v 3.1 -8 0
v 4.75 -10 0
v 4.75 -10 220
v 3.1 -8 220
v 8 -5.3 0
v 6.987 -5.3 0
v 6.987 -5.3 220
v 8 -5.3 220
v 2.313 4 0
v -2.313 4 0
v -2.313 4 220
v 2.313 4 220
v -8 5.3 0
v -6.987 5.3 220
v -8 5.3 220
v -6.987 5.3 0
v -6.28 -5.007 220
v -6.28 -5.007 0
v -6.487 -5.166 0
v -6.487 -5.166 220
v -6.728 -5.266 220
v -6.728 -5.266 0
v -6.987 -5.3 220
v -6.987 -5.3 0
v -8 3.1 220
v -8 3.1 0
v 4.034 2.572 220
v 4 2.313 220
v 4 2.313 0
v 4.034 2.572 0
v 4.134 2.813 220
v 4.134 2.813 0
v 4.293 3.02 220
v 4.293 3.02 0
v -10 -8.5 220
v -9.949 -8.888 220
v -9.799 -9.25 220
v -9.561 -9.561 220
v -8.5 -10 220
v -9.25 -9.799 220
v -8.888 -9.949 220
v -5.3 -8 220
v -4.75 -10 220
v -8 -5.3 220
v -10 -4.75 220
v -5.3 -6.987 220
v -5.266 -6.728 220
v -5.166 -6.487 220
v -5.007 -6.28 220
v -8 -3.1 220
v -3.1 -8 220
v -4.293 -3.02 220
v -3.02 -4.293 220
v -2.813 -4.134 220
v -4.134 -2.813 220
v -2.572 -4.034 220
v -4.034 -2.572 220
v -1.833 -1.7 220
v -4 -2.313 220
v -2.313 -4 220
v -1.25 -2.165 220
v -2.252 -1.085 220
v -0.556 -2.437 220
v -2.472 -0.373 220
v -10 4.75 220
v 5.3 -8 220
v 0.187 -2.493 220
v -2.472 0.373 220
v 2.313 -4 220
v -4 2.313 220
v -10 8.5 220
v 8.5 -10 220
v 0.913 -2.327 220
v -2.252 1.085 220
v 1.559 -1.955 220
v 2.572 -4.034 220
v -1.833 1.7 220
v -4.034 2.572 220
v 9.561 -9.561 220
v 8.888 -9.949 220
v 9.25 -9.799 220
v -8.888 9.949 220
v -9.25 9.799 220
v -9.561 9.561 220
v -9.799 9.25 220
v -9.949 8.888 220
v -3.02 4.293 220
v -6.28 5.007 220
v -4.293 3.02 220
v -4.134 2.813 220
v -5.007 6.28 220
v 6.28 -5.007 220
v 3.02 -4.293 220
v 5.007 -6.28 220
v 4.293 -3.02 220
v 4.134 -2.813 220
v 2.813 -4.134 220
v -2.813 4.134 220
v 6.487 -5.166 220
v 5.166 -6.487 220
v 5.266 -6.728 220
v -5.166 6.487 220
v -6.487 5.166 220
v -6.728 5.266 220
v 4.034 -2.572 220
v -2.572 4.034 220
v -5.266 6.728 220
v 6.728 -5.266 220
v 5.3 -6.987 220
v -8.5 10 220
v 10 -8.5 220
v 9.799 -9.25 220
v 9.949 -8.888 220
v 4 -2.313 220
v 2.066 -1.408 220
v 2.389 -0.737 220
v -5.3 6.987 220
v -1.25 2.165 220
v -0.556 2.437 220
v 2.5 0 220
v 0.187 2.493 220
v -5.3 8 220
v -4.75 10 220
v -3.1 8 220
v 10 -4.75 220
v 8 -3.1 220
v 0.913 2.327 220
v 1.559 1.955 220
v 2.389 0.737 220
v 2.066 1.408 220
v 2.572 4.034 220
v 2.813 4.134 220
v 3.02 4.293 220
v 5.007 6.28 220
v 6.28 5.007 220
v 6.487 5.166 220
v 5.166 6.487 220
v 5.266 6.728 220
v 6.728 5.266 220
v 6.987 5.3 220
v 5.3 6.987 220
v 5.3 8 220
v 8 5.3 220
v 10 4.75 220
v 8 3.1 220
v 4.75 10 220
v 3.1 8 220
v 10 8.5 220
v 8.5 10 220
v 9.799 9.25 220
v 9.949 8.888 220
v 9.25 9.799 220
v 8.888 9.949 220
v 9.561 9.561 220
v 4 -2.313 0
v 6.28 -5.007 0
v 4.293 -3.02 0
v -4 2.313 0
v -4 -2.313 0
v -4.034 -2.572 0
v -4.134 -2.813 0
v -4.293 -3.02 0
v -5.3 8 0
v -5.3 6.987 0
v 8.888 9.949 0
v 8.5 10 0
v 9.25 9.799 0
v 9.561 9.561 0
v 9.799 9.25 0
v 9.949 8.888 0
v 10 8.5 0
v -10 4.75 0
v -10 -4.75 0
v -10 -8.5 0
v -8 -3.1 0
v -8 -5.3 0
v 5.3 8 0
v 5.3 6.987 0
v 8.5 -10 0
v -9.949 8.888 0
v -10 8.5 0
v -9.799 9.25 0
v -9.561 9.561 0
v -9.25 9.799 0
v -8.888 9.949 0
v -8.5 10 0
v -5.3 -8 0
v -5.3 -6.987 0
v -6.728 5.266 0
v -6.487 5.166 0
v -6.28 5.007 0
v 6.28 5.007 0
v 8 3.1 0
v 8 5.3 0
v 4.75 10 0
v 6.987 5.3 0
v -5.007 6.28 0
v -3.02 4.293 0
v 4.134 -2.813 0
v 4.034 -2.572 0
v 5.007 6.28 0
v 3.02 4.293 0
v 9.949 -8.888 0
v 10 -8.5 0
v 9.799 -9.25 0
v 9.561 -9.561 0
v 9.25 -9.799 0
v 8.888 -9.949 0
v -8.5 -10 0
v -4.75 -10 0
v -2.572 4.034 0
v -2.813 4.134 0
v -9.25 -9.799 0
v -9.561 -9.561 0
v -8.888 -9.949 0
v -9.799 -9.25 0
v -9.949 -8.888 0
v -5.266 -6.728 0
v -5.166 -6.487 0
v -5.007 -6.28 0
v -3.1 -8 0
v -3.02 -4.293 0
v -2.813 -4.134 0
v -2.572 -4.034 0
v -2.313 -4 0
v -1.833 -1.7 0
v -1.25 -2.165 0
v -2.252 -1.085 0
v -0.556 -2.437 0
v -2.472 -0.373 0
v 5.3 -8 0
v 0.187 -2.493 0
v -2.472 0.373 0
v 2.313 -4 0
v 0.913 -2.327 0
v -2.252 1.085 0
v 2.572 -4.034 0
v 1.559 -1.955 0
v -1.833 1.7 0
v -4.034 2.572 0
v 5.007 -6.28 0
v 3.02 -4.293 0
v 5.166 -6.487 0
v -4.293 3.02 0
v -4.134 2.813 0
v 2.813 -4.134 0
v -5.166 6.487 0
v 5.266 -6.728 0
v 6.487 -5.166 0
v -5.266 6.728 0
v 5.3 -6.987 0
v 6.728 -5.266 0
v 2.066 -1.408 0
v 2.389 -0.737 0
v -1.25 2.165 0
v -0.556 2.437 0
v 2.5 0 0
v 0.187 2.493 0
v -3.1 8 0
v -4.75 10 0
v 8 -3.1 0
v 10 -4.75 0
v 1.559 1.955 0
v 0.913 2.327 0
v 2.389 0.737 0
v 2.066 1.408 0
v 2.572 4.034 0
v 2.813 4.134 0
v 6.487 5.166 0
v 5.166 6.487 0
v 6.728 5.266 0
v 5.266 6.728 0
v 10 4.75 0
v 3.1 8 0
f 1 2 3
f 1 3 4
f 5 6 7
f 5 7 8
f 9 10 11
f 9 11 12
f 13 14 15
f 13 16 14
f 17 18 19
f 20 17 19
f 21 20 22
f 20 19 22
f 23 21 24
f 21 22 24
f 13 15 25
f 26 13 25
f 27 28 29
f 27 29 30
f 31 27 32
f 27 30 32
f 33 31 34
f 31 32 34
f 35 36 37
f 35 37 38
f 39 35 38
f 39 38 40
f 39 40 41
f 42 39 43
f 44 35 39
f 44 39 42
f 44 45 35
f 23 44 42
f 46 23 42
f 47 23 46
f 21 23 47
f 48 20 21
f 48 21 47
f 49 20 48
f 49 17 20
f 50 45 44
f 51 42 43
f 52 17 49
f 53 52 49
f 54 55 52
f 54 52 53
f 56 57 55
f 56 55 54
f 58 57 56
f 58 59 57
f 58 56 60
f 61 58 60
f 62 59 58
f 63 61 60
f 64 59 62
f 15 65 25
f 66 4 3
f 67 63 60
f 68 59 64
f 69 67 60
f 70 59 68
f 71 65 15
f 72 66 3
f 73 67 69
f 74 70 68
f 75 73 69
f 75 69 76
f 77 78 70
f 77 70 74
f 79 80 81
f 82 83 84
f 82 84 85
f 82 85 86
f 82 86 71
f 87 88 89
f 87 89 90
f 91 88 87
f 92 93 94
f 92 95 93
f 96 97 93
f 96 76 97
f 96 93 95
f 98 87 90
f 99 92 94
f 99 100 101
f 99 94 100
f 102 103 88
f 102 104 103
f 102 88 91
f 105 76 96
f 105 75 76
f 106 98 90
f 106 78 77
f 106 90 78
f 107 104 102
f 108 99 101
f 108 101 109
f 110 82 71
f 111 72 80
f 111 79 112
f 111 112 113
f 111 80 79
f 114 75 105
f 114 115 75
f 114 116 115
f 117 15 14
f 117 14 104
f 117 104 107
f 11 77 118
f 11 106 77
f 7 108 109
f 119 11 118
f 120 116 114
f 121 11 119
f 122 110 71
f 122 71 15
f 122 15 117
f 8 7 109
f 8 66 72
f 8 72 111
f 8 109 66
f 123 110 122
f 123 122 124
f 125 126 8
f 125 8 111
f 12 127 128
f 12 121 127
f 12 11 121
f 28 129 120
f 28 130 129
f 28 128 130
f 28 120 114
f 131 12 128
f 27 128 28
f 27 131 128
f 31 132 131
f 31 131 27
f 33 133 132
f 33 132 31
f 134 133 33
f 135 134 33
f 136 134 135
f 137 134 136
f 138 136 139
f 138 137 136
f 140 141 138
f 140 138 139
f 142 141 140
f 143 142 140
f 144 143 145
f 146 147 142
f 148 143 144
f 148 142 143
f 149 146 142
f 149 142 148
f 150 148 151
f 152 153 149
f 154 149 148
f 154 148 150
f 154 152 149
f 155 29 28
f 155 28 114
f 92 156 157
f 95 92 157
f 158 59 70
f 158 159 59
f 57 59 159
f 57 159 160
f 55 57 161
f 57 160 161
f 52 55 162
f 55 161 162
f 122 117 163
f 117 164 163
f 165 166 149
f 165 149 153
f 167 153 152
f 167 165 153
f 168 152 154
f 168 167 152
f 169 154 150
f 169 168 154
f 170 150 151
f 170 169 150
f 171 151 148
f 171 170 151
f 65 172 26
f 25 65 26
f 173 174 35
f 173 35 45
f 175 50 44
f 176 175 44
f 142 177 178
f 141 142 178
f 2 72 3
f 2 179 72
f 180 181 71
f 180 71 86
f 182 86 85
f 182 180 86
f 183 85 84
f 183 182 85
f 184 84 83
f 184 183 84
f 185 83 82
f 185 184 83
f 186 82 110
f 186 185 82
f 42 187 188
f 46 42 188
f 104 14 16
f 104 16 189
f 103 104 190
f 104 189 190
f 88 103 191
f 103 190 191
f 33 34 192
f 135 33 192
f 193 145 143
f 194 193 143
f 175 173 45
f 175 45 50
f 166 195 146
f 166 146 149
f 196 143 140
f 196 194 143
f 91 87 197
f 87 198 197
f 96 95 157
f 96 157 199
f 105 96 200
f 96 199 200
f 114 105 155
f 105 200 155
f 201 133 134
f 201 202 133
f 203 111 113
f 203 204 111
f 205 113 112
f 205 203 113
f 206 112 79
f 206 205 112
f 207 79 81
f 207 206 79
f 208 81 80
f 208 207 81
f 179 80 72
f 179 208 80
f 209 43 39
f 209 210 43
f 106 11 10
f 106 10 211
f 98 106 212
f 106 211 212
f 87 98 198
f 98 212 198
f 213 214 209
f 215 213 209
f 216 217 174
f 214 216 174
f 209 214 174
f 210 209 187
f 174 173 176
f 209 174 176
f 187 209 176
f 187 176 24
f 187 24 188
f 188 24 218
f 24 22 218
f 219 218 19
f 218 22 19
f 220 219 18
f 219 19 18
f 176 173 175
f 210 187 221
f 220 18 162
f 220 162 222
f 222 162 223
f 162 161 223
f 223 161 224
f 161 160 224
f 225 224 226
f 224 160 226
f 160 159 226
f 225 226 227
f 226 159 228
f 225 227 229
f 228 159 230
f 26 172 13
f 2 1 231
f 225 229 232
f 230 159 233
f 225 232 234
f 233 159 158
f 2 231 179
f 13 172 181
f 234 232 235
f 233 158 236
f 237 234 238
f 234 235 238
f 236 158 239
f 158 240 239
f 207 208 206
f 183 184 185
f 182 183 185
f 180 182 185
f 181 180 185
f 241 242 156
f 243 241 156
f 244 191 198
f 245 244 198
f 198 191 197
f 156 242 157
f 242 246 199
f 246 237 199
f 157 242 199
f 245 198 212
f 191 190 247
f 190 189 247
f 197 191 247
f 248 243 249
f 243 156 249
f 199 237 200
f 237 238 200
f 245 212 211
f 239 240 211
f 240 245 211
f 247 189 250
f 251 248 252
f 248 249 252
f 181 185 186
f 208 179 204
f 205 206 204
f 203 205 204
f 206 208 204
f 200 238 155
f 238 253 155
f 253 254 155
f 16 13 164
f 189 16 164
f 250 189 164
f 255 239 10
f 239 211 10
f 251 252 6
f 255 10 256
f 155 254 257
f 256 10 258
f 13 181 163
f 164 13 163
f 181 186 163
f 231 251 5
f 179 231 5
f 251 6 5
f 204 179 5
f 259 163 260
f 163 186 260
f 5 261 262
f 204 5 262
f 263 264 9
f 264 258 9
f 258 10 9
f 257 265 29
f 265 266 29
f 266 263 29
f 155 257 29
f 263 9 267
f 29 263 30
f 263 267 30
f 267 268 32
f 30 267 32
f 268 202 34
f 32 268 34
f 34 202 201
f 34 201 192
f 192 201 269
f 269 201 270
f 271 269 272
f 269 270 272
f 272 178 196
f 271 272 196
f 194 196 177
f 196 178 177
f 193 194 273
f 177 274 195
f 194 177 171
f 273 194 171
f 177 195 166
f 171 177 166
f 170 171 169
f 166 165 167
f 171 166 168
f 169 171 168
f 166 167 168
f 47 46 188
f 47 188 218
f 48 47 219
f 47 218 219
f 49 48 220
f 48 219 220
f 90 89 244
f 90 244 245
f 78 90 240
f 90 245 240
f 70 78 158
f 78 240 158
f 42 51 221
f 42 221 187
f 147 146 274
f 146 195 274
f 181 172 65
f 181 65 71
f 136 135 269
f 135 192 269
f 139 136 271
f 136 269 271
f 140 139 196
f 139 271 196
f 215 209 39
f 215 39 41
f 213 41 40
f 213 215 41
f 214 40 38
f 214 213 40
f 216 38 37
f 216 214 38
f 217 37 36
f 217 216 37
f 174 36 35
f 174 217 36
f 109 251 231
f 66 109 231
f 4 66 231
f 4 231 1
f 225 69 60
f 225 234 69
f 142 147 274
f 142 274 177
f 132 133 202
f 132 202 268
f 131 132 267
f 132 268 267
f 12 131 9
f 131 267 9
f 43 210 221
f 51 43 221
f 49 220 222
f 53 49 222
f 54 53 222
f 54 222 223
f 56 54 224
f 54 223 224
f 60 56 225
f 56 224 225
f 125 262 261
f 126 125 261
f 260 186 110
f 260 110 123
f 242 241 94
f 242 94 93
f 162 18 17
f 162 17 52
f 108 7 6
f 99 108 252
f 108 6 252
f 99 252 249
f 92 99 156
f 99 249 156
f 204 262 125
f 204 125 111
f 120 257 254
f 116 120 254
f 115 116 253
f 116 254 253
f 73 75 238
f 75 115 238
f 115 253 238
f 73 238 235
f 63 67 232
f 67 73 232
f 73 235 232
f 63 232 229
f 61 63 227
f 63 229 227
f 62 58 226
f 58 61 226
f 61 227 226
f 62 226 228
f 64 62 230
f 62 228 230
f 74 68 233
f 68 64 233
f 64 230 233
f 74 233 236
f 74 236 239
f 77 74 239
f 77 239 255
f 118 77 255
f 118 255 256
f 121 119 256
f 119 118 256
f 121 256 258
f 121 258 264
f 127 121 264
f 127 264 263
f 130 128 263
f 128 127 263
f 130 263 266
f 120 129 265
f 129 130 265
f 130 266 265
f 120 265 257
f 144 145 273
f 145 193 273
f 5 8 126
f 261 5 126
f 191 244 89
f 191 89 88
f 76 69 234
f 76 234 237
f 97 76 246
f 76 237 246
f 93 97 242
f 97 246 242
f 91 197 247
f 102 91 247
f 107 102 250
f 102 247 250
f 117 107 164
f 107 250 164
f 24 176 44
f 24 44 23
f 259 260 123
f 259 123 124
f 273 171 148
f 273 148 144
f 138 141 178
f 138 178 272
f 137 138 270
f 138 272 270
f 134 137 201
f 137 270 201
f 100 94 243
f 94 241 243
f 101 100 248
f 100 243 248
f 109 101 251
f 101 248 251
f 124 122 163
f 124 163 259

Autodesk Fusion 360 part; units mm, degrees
sketch "Sketch1" plane through (0, 0, 0) normal (0, 0, 1) x (1, 0, 0)
  circle A0 centre (0, 0) radius 2.5
  arc A1 (-10, -8.5) -> (-8.5, -10) centre (-8.5, -8.5) ccw
  arc A2 (8.5, -10) -> (10, -8.5) centre (8.5, -8.5) ccw
  arc A3 (10, 8.5) -> (8.5, 10) centre (8.5, 8.5) ccw
  arc A4 (-8.5, 10) -> (-10, 8.5) centre (-8.5, 8.5) ccw
  line L0 (-6.987, 5.3) -> (-8, 5.3)
  line L1 (6.987, -5.3) -> (8, -5.3)
  line L2 (8, 5.3) -> (6.987, 5.3)
  line L3 (-8, -5.3) -> (-6.987, -5.3)
  line L4 (-5.3, -8) -> (-5.3, -6.987)
  line L5 (-5.3, 6.987) -> (-5.3, 8)
  line L6 (5.3, 8) -> (5.3, 6.987)
  line L7 (5.3, -6.987) -> (5.3, -8)
  line L8 (2.313, -4) -> (-2.313, -4)
  line L9 (-4, -2.313) -> (-4, 2.313)
  line L10 (-2.313, 4) -> (2.313, 4)
  line L11 (4, 2.313) -> (4, -2.313)
  line L12 (6.2799, -5.0071) -> (4.2929, -3.0201)
  line L13 (5.0071, -6.2799) -> (3.0201, -4.2929)
  line L14 (-5.0071, -6.2799) -> (-3.0201, -4.2929)
  line L15 (-6.2799, -5.0071) -> (-4.2929, -3.0201)
  line L16 (-4.2929, 3.0201) -> (-6.2799, 5.0071)
  line L17 (-3.0201, 4.2929) -> (-5.0071, 6.2799)
  line L18 (3.0201, 4.2929) -> (5.0071, 6.2799)
  line L19 (4.2929, 3.0201) -> (6.2799, 5.0071)
  line L20 (0, -15) -> (0, 19) construction
  line L21 (-20, 0) -> (20, 0) construction
  line L22 (-10, -8.5) -> (-10, -4.75)
  line L23 (-10, 4.75) -> (-10, 8.5)
  line L24 (8.5, -10) -> (4.75, -10)
  line L25 (-4.75, -10) -> (-8.5, -10)
  line L26 (10, 8.5) -> (10, 4.75)
  line L27 (10, -4.75) -> (10, -8.5)
  line L28 (-8.5, 10) -> (-4.75, 10)
  line L29 (4.75, 10) -> (8.5, 10)
  line L30 (5.3, -8) -> (3.1, -8)
  line L31 (-3.1, -8) -> (-5.3, -8)
  line L32 (8, -5.3) -> (8, -3.1)
  line L33 (8, 3.1) -> (8, 5.3)
  line L34 (-5.3, 8) -> (-3.1, 8)
  line L35 (3.1, 8) -> (5.3, 8)
  line L36 (-8, 5.3) -> (-8, 3.1)
  line L37 (-8, -3.1) -> (-8, -5.3)
  line L38 (-4.75, -10) -> (-3.1, -8)
  line L39 (4.75, -10) -> (3.1, -8)
  line L40 (10, -4.75) -> (8, -3.1)
  line L41 (8, 3.1) -> (10, 4.75)
  line L42 (4.75, 10) -> (3.1, 8)
  line L43 (-4.75, 10) -> (-3.1, 8)
  line L44 (-10, 4.75) -> (-8, 3.1)
  line L45 (-10, -4.75) -> (-8, -3.1)
  arc A5 (-5.0071, -6.2799) -> (-5.3, -6.987) centre (-4.3, -6.987) ccw
  arc A6 (5.3, -6.987) -> (5.0071, -6.2799) centre (4.3, -6.987) ccw
  arc A7 (3.0201, -4.2929) -> (2.313, -4) centre (2.313, -5) ccw
  arc A8 (-2.313, -4) -> (-3.0201, -4.2929) centre (-2.313, -5) ccw
  arc A9 (-6.987, -5.3) -> (-6.2799, -5.0071) centre (-6.987, -4.3) ccw
  arc A10 (-4.2929, -3.0201) -> (-4, -2.313) centre (-5, -2.313) ccw
  arc A11 (-4, 2.313) -> (-4.2929, 3.0201) centre (-5, 2.313) ccw
  arc A12 (-6.2799, 5.0071) -> (-6.987, 5.3) centre (-6.987, 4.3) ccw
  arc A13 (6.2799, -5.0071) -> (6.987, -5.3) centre (6.987, -4.3) ccw
  arc A14 (4, -2.313) -> (4.2929, -3.0201) centre (5, -2.313) ccw
  arc A15 (4.2929, 3.0201) -> (4, 2.313) centre (5, 2.313) ccw
  arc A16 (6.987, 5.3) -> (6.2799, 5.0071) centre (6.987, 4.3) ccw
  arc A17 (5.0071, 6.2799) -> (5.3, 6.987) centre (4.3, 6.987) ccw
  arc A18 (2.313, 4) -> (3.0201, 4.2929) centre (2.313, 5) ccw
  arc A19 (-3.0201, 4.2929) -> (-2.313, 4) centre (-2.313, 5) ccw
  arc A20 (-5.3, 6.987) -> (-5.0071, 6.2799) centre (-4.3, 6.987) ccw
  dimension "d3" = 5
  dimension "d4" = 1.5
  dimension "d5" = 16
  dimension "d6" = 10.6
  dimension "d7" = 10.6
  dimension "d8" = 16
  dimension "d23" = 1
extrude "Extrude1" add sketch "Sketch1" along normal blind 149

Autodesk Fusion 360 part; units mm, degrees
sketch "Sketch1" plane through (0, 0, 0) normal (0, 0, 1) x (1, 0, 0)
  circle A0 centre (0, 0) radius 2.5
  arc A1 (-10, -8.5) -> (-8.5, -10) centre (-8.5, -8.5) ccw
  arc A2 (8.5, -10) -> (10, -8.5) centre (8.5, -8.5) ccw
  arc A3 (10, 8.5) -> (8.5, 10) centre (8.5, 8.5) ccw
  arc A4 (-8.5, 10) -> (-10, 8.5) centre (-8.5, 8.5) ccw
  line L0 (-6.987, 5.3) -> (-8, 5.3)
  line L1 (6.987, -5.3) -> (8, -5.3)
  line L2 (8, 5.3) -> (6.987, 5.3)
  line L3 (-8, -5.3) -> (-6.987, -5.3)
  line L4 (-5.3, -8) -> (-5.3, -6.987)
  line L5 (-5.3, 6.987) -> (-5.3, 8)
  line L6 (5.3, 8) -> (5.3, 6.987)
  line L7 (5.3, -6.987) -> (5.3, -8)
  line L8 (2.313, -4) -> (-2.313, -4)
  line L9 (-4, -2.313) -> (-4, 2.313)
  line L10 (-2.313, 4) -> (2.313, 4)
  line L11 (4, 2.313) -> (4, -2.313)
  line L12 (6.2799, -5.0071) -> (4.2929, -3.0201)
  line L13 (5.0071, -6.2799) -> (3.0201, -4.2929)
  line L14 (-5.0071, -6.2799) -> (-3.0201, -4.2929)
  line L15 (-6.2799, -5.0071) -> (-4.2929, -3.0201)
  line L16 (-4.2929, 3.0201) -> (-6.2799, 5.0071)
  line L17 (-3.0201, 4.2929) -> (-5.0071, 6.2799)
  line L18 (3.0201, 4.2929) -> (5.0071, 6.2799)
  line L19 (4.2929, 3.0201) -> (6.2799, 5.0071)
  line L20 (0, -15) -> (0, 19) construction
  line L21 (-20, 0) -> (20, 0) construction
  line L22 (-10, -8.5) -> (-10, -4.75)
  line L23 (-10, 4.75) -> (-10, 8.5)
  line L24 (8.5, -10) -> (4.75, -10)
  line L25 (-4.75, -10) -> (-8.5, -10)
  line L26 (10, 8.5) -> (10, 4.75)
  line L27 (10, -4.75) -> (10, -8.5)
  line L28 (-8.5, 10) -> (-4.75, 10)
  line L29 (4.75, 10) -> (8.5, 10)
  line L30 (5.3, -8) -> (3.1, -8)
  line L31 (-3.1, -8) -> (-5.3, -8)
  line L32 (8, -5.3) -> (8, -3.1)
  line L33 (8, 3.1) -> (8, 5.3)
  line L34 (-5.3, 8) -> (-3.1, 8)
  line L35 (3.1, 8) -> (5.3, 8)
  line L36 (-8, 5.3) -> (-8, 3.1)
  line L37 (-8, -3.1) -> (-8, -5.3)
  line L38 (-4.75, -10) -> (-3.1, -8)
  line L39 (4.75, -10) -> (3.1, -8)
  line L40 (10, -4.75) -> (8, -3.1)
  line L41 (8, 3.1) -> (10, 4.75)
  line L42 (4.75, 10) -> (3.1, 8)
  line L43 (-4.75, 10) -> (-3.1, 8)
  line L44 (-10, 4.75) -> (-8, 3.1)
  line L45 (-10, -4.75) -> (-8, -3.1)
  arc A5 (-5.0071, -6.2799) -> (-5.3, -6.987) centre (-4.3, -6.987) ccw
  arc A6 (5.3, -6.987) -> (5.0071, -6.2799) centre (4.3, -6.987) ccw
  arc A7 (3.0201, -4.2929) -> (2.313, -4) centre (2.313, -5) ccw
  arc A8 (-2.313, -4) -> (-3.0201, -4.2929) centre (-2.313, -5) ccw
  arc A9 (-6.987, -5.3) -> (-6.2799, -5.0071) centre (-6.987, -4.3) ccw
  arc A10 (-4.2929, -3.0201) -> (-4, -2.313) centre (-5, -2.313) ccw
  arc A11 (-4, 2.313) -> (-4.2929, 3.0201) centre (-5, 2.313) ccw
  arc A12 (-6.2799, 5.0071) -> (-6.987, 5.3) centre (-6.987, 4.3) ccw
  arc A13 (6.2799, -5.0071) -> (6.987, -5.3) centre (6.987, -4.3) ccw
  arc A14 (4, -2.313) -> (4.2929, -3.0201) centre (5, -2.313) ccw
  arc A15 (4.2929, 3.0201) -> (4, 2.313) centre (5, 2.313) ccw
  arc A16 (6.987, 5.3) -> (6.2799, 5.0071) centre (6.987, 4.3) ccw
  arc A17 (5.0071, 6.2799) -> (5.3, 6.987) centre (4.3, 6.987) ccw
  arc A18 (2.313, 4) -> (3.0201, 4.2929) centre (2.313, 5) ccw
  arc A19 (-3.0201, 4.2929) -> (-2.313, 4) centre (-2.313, 5) ccw
  arc A20 (-5.3, 6.987) -> (-5.0071, 6.2799) centre (-4.3, 6.987) ccw
  dimension "d3" = 5
  dimension "d4" = 1.5
  dimension "d5" = 16
  dimension "d6" = 10.6
  dimension "d7" = 10.6
  dimension "d8" = 16
  dimension "d23" = 1
extrude "Extrude1" add sketch "Sketch1" along normal blind 220
